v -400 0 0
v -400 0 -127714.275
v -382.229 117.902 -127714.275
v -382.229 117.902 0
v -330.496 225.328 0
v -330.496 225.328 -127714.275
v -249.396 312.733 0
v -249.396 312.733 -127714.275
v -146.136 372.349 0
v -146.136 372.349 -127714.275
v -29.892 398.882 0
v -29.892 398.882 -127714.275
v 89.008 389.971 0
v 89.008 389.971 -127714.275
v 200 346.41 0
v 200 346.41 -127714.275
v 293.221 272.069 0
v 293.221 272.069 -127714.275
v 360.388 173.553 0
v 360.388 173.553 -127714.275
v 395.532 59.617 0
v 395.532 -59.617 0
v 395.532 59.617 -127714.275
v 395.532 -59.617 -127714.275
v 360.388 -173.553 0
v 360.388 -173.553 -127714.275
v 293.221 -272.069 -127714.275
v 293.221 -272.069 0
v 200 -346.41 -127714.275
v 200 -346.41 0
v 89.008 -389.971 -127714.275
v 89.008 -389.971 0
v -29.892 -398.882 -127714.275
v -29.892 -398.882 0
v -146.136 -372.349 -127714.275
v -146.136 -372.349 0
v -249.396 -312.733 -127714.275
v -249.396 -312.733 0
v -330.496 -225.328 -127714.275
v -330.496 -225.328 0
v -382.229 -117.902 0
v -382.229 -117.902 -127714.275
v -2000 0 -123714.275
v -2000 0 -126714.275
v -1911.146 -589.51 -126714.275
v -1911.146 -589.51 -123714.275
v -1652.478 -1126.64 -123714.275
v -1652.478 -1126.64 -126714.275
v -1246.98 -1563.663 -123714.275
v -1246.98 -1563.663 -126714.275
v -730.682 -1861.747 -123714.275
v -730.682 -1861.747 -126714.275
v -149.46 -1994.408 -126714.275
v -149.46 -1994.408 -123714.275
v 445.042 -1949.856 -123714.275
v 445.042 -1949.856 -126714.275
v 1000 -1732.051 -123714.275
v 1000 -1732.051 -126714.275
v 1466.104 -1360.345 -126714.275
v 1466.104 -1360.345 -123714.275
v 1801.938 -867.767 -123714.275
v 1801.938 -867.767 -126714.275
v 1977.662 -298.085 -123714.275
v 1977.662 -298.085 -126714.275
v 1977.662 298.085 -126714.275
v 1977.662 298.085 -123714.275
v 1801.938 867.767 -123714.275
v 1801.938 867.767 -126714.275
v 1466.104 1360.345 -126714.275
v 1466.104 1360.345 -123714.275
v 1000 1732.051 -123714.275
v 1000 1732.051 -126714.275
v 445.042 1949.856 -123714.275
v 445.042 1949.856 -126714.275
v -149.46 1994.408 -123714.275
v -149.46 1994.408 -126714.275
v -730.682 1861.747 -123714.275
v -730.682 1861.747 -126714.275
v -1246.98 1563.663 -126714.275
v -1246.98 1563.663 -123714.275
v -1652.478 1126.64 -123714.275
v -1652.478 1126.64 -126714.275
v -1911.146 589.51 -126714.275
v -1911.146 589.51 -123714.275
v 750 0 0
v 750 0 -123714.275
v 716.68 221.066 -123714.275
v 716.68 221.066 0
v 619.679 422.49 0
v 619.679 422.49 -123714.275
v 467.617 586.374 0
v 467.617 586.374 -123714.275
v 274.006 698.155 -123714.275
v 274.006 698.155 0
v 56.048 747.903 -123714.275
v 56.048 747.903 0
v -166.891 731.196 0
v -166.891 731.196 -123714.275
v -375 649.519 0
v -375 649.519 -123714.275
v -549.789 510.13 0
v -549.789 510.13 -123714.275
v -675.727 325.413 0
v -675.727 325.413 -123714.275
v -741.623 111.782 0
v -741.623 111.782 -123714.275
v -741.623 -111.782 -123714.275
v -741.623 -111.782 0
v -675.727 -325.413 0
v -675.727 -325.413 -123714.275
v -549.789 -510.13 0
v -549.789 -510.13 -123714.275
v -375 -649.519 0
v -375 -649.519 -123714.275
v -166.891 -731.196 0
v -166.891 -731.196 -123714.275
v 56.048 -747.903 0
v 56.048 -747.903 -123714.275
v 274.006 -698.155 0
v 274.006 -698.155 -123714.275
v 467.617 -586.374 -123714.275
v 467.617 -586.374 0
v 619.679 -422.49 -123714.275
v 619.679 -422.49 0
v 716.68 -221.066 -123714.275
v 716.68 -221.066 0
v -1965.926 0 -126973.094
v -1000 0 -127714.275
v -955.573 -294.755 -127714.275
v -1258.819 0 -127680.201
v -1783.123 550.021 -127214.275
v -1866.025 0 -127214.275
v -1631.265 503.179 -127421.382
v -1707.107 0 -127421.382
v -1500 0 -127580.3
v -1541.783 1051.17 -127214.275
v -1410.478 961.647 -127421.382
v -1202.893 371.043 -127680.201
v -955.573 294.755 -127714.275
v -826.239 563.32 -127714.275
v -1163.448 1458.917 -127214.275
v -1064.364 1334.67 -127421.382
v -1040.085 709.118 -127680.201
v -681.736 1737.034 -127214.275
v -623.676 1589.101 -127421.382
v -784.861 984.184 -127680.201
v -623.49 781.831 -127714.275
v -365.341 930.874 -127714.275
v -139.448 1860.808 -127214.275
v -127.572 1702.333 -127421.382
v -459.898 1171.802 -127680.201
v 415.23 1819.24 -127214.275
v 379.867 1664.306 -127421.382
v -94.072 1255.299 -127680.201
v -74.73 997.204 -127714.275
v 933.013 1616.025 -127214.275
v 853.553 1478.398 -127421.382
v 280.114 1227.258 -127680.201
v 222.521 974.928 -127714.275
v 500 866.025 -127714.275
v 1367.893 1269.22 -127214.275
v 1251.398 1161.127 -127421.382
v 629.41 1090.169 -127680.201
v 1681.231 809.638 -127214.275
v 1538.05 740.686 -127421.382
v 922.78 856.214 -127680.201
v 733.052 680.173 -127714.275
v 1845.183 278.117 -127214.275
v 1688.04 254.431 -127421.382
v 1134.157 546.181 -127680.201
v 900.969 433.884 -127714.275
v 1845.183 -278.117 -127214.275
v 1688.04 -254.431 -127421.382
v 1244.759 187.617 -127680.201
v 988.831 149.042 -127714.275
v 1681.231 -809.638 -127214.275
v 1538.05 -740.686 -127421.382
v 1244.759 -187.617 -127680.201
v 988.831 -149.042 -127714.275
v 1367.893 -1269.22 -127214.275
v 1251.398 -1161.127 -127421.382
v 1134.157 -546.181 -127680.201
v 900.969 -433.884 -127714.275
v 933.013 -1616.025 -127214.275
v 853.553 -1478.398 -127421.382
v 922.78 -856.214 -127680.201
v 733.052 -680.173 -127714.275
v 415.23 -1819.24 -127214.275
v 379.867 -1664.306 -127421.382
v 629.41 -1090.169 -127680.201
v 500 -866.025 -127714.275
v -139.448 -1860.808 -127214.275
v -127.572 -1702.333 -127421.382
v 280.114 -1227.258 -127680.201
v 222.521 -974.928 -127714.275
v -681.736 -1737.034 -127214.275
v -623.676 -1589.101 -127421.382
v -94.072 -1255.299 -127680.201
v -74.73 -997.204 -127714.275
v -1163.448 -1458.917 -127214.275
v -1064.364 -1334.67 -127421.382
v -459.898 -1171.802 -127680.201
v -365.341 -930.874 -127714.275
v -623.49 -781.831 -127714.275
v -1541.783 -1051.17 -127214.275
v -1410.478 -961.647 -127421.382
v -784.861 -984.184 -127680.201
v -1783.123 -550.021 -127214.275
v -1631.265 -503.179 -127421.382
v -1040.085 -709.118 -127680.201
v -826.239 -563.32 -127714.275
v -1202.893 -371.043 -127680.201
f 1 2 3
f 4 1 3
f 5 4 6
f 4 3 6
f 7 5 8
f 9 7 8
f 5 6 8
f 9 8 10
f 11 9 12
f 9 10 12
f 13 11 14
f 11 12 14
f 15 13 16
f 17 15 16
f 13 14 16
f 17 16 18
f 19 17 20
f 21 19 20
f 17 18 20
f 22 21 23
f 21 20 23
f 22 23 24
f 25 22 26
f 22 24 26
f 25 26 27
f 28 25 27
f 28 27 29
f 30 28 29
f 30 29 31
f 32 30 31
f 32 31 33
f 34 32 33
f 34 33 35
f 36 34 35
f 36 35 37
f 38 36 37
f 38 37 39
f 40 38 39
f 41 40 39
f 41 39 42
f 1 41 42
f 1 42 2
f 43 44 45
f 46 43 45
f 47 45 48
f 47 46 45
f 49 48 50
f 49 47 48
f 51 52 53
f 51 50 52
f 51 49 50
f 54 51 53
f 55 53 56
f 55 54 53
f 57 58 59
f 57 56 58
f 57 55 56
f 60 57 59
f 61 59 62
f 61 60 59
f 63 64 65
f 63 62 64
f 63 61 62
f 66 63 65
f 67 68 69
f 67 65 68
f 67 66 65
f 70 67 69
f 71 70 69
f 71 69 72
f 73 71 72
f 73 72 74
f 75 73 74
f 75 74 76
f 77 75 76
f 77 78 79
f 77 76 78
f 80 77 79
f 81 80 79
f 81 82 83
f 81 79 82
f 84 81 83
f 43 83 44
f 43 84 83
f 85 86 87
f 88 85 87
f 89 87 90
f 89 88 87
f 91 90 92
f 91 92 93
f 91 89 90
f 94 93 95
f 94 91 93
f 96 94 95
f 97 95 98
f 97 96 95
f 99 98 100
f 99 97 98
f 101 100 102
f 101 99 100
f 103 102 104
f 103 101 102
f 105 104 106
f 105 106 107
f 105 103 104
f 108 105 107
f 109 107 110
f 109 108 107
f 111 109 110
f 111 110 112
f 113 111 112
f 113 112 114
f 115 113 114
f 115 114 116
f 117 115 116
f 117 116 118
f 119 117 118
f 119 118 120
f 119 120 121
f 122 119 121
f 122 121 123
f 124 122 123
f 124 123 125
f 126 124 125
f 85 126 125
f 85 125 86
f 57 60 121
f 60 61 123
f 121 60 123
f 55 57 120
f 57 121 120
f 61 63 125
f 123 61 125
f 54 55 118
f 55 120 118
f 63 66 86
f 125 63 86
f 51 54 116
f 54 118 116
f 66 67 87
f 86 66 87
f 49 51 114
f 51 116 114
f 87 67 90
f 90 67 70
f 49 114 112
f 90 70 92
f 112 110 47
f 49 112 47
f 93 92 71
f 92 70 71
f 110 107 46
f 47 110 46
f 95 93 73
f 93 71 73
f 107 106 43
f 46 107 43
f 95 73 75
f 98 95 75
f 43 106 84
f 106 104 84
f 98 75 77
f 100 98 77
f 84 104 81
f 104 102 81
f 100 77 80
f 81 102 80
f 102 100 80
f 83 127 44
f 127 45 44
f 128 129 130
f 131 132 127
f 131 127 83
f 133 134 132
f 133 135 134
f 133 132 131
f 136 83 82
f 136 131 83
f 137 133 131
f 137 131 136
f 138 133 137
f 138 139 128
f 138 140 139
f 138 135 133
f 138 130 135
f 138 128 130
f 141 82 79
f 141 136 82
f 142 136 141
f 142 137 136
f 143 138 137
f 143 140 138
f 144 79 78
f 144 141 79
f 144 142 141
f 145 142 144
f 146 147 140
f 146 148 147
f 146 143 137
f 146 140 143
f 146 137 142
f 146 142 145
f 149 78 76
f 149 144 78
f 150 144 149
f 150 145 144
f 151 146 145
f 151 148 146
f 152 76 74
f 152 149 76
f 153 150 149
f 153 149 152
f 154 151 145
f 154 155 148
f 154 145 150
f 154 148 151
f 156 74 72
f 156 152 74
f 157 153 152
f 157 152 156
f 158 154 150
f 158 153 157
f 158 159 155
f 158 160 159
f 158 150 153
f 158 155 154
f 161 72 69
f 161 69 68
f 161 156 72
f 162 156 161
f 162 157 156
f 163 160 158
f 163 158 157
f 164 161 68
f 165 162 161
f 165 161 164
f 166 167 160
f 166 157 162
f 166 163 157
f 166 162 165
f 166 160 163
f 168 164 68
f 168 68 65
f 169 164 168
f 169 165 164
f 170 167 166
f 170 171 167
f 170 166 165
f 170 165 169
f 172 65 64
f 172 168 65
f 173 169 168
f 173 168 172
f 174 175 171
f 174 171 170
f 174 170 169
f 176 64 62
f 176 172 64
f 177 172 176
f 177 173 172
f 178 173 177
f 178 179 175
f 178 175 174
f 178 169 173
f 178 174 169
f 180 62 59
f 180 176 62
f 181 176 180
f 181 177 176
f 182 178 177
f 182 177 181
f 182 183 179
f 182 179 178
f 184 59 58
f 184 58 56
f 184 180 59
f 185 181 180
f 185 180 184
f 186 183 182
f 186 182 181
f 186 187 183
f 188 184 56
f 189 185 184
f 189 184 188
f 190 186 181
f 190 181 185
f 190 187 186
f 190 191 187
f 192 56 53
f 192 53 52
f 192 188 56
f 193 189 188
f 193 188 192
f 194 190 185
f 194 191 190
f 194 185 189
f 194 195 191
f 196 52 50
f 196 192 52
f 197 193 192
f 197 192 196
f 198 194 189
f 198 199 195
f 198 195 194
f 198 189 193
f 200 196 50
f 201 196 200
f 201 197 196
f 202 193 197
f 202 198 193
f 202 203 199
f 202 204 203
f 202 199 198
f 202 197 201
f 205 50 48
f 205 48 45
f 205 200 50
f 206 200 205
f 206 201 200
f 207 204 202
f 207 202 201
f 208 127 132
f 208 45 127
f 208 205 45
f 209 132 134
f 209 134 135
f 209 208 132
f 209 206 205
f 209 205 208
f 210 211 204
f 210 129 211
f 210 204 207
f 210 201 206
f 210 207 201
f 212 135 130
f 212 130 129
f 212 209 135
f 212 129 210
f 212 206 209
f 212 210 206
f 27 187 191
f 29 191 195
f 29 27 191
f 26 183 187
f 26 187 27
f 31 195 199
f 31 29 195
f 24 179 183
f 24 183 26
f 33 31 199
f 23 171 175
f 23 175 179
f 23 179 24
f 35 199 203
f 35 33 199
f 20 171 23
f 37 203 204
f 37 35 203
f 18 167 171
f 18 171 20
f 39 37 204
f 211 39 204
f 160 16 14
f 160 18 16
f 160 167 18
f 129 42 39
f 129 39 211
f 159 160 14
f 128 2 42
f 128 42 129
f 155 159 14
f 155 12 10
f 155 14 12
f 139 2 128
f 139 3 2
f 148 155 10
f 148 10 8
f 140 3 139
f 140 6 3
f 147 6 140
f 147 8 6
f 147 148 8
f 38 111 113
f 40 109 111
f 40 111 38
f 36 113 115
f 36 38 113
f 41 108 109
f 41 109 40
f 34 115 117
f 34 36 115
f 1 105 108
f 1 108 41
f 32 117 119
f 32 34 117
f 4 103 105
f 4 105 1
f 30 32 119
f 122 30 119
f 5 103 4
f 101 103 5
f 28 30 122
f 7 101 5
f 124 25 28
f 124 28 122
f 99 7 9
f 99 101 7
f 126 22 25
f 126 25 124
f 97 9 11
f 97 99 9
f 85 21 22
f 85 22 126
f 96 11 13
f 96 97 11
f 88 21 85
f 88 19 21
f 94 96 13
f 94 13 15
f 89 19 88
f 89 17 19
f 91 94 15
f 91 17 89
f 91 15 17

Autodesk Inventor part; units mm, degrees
ref_plane "YZ Plane" through (0, 0, 0) normal (1, 0, 0) x (0, 1, 0)
ref_plane "XZ Plane" through (0, 0, 0) normal (0, 1, 0) x (-1, 0, 0)
sketch "Sketch1" plane through (0, 0, 0) normal (1, 0, 0) x (0, 1, 0)
  point P0 (0, 0)
sketch "Sketch2" plane through (0, 0, 0) normal (0, 0, 1) x (1, 0, 0)
  circle A0 centre (0, 0) radius 750
  dimension "d0" = 1500
ref_plane "Work Plane1" through (-26382.6859, -30000, -123714.275) normal (0, 0, -1) x (0, 1, 0)
extrude "Extrusion1" add sketch "Sketch2" against normal up to surface (123714.275 mm away)
sketch "Sketch3" plane through (0, 0, -123714.275) normal (0, 0, -1) x (-1, 0, 0)
  circle A0 centre (0, 0) radius 2000
  dimension "d3" = 4000
extrude "Extrusion2" add sketch "Sketch3" along normal blind 4000
fillet "Fillet1" radius 1000 1 edges at (2000, 0, -127714.275)
sketch "Sketch4" plane through (0, 0, -127714.275) normal (0, 0, -1) x (-1, 0, 0)
  circle A0 centre (0, 0) radius 400
  dimension "d7" = 800
extrude "Extrusion3" cut sketch "Sketch4" against normal through all
sketch "Sketch5" plane through (0, 0, 0) normal (0, 0, 1) x (1, 0, 0)
  circle A0 centre (0, 0) radius 400
  circle A1 centre (0, 0) radius 1600
  dimension "d10" = 3200
properties part number "base"
